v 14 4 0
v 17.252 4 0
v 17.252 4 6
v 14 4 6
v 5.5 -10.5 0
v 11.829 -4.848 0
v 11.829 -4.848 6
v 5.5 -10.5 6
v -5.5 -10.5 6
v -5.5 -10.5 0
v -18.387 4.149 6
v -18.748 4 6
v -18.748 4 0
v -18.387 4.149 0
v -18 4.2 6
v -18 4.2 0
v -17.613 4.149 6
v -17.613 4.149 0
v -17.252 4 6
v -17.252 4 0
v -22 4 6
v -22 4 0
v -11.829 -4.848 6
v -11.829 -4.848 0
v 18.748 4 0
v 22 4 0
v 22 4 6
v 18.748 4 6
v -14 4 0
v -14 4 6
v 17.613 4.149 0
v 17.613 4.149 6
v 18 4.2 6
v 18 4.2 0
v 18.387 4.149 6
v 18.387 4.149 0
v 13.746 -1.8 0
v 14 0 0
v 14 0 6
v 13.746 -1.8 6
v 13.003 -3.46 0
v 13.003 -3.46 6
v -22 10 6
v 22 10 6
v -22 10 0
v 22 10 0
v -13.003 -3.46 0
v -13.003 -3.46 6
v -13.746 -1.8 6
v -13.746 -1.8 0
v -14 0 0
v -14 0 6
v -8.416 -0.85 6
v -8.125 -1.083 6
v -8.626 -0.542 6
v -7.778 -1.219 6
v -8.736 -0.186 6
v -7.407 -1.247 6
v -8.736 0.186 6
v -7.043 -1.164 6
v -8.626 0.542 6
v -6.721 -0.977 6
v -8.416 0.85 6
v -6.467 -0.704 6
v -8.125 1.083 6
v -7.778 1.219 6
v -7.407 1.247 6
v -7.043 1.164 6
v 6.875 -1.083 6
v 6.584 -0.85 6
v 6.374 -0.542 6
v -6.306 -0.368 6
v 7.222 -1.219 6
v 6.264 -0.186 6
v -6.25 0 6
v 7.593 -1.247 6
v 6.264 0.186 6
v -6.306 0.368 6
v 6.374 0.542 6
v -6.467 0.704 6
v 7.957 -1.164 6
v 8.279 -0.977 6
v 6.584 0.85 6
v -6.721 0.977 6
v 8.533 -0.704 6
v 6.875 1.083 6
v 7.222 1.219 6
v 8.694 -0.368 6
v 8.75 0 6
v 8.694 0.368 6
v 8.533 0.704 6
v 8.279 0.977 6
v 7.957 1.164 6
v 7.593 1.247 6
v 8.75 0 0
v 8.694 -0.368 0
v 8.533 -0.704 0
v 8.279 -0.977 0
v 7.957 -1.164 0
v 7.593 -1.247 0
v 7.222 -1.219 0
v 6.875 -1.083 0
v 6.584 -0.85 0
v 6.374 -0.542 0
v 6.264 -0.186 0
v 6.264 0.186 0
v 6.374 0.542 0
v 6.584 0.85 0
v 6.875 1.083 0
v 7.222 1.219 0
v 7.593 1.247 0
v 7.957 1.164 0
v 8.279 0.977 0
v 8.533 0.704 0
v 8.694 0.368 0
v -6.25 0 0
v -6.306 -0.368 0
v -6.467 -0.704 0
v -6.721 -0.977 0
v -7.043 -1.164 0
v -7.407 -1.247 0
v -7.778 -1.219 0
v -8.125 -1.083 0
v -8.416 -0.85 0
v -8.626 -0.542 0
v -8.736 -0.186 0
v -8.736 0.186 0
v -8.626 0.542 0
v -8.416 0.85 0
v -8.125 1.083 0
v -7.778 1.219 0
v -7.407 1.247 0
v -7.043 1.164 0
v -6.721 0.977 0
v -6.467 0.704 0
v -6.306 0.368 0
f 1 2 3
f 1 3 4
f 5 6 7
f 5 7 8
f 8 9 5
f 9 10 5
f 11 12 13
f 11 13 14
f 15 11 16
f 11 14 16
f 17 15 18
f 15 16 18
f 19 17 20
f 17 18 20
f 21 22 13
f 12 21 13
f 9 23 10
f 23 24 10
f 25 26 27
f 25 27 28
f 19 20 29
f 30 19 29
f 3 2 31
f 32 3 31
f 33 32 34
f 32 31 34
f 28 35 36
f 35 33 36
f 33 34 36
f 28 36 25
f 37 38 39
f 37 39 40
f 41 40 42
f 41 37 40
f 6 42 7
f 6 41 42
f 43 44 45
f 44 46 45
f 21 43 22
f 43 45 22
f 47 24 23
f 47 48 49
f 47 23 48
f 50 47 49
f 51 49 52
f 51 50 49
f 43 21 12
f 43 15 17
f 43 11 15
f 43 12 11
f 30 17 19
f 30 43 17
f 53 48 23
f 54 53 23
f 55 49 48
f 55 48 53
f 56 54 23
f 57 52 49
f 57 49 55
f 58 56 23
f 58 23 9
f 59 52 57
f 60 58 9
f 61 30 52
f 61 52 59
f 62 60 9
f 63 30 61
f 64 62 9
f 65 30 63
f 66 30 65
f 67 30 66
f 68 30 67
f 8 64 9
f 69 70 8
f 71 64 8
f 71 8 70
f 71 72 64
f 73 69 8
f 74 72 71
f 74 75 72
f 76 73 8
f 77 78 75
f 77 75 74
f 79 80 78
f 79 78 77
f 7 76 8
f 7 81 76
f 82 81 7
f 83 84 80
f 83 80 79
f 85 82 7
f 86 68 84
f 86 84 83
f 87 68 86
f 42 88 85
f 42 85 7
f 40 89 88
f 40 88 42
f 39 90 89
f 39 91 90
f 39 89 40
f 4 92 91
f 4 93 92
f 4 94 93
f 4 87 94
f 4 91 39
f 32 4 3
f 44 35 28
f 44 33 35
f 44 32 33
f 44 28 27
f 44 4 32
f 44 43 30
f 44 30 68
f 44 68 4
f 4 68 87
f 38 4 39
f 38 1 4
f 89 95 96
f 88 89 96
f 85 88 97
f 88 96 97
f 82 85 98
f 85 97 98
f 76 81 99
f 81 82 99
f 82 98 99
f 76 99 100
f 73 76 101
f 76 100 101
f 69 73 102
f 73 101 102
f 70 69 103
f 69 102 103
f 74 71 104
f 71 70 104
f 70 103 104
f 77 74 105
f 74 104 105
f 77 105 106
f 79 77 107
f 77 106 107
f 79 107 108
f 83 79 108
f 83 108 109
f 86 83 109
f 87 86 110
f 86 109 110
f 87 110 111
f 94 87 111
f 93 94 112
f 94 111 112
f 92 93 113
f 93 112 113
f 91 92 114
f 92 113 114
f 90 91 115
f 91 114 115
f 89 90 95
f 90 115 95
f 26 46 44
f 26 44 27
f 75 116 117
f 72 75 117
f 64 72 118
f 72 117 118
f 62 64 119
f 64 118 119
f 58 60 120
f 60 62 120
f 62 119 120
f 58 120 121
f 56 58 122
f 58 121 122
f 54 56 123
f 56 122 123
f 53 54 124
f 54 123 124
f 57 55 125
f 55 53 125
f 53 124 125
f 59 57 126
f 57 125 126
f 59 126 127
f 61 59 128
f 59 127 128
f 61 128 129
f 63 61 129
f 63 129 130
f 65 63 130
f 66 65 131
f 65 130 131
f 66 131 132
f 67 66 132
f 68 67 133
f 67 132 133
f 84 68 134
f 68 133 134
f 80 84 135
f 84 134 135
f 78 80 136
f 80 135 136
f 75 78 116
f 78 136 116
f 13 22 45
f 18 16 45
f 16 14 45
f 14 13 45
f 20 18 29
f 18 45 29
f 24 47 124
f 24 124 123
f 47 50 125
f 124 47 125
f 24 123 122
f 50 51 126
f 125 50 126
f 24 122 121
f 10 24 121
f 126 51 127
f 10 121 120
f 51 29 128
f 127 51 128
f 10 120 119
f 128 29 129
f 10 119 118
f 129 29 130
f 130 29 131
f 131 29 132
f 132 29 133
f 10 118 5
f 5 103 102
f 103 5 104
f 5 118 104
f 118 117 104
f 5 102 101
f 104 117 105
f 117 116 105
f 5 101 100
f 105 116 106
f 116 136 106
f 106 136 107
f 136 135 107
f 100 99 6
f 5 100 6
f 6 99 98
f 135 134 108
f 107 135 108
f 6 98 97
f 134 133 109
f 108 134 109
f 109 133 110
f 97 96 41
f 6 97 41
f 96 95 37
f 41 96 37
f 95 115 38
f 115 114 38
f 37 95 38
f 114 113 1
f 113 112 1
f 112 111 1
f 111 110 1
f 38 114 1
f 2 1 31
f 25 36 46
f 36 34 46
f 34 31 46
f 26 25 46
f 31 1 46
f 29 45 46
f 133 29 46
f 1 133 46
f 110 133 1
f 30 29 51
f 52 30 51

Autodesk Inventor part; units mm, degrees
ref_plane "YZ Plane" through (0, 0, 0) normal (1, 0, 0) x (0, 1, 0)
ref_plane "XZ Plane" through (0, 0, 0) normal (0, 1, 0) x (-1, 0, 0)
ref_plane "XY Plane" through (0, 0, 0) normal (0, 0, 1) x (1, 0, 0)
sketch "スケッチ1" plane through (0, 0, 0) normal (0, 0, 1) x (1, 0, 0)
  circle A0 centre (-7.5, 0) radius 1.25
  circle A1 centre (7.5, 0) radius 1.25
  line L0 (-14, -10.5) -> (-5.5, -10.5) construction
  line L1 (22, 10) -> (-22, 10)
  arc A2 (-18.7483, 4) -> (-17.2517, 4) centre (-18, 2.7) ccw construction
  arc A3 (17.2517, 4) -> (18.7483, 4) centre (18, 2.7) ccw construction
  line L2 (-22, 10) -> (-22, 4)
  line L3 (-22, 4) -> (-18.7483, 4)
  line L4 (-14, 4) -> (-14, 0)
  line L5 (22, 10) -> (22, 4)
  line L6 (22, 4) -> (18.7483, 4)
  line L7 (14, 4) -> (14, 0)
  arc A4 (-17.2517, 4) -> (-18.7483, 4) centre (-18, 2.7) ccw
  line L8 (-18.7483, 4) -> (-17.2517, 4) construction
  line L9 (-17.2517, 4) -> (-14, 4)
  arc A5 (18.7483, 4) -> (17.2517, 4) centre (18, 2.7) ccw
  line L10 (18.7483, 4) -> (17.2517, 4) construction
  line L11 (17.2517, 4) -> (14, 4)
  arc A6 (-14, 0) -> (-11.8293, -4.8484) centre (-7.5, 0) ccw
  arc A7 (11.8293, -4.8484) -> (14, 0) centre (7.5, 0) ccw
  line L12 (-11.8293, -4.8484) -> (-5.5, -10.5)
  line L13 (11.8293, -4.8484) -> (5.5, -10.5)
  line L14 (-14, 0) -> (-14, -10.5) construction
  line L15 (-5.5, -10.5) -> (5.5, -10.5)
  line L16 (5.5, -10.5) -> (14, -10.5) construction
  line L17 (14, 0) -> (14, -10.5) construction
  point P0 (0, 0)
  dimension "d0" = 2.5
  dimension "d1" = 2.5
  dimension "d2" = 15
  dimension "d3" = 7.5
  dimension "d8" = 10.5
  dimension "d9" = 10
  dimension "d15" = 3
  dimension "d16" = 3
  dimension "d21" = 6.5
  dimension "d22" = 6.5
  dimension "d23" = 10.5
  dimension "d24" = 6
  dimension "d25" = 6
  dimension "d26" = 8
  dimension "d27" = 8
  dimension "d28" = 1.3
  dimension "d29" = 1.3
  dimension "d30" = 4
  dimension "d31" = 4
  dimension "d34" = 11
  dimension "d35" = 5.5
extrude "押し出し1" add sketch "スケッチ1" along normal blind 6
equation "\"d3\" = 0.5 * d2"
equation "\"d35\" = 0.5 * d34"
properties part number "ベルト固定_アルミ"
